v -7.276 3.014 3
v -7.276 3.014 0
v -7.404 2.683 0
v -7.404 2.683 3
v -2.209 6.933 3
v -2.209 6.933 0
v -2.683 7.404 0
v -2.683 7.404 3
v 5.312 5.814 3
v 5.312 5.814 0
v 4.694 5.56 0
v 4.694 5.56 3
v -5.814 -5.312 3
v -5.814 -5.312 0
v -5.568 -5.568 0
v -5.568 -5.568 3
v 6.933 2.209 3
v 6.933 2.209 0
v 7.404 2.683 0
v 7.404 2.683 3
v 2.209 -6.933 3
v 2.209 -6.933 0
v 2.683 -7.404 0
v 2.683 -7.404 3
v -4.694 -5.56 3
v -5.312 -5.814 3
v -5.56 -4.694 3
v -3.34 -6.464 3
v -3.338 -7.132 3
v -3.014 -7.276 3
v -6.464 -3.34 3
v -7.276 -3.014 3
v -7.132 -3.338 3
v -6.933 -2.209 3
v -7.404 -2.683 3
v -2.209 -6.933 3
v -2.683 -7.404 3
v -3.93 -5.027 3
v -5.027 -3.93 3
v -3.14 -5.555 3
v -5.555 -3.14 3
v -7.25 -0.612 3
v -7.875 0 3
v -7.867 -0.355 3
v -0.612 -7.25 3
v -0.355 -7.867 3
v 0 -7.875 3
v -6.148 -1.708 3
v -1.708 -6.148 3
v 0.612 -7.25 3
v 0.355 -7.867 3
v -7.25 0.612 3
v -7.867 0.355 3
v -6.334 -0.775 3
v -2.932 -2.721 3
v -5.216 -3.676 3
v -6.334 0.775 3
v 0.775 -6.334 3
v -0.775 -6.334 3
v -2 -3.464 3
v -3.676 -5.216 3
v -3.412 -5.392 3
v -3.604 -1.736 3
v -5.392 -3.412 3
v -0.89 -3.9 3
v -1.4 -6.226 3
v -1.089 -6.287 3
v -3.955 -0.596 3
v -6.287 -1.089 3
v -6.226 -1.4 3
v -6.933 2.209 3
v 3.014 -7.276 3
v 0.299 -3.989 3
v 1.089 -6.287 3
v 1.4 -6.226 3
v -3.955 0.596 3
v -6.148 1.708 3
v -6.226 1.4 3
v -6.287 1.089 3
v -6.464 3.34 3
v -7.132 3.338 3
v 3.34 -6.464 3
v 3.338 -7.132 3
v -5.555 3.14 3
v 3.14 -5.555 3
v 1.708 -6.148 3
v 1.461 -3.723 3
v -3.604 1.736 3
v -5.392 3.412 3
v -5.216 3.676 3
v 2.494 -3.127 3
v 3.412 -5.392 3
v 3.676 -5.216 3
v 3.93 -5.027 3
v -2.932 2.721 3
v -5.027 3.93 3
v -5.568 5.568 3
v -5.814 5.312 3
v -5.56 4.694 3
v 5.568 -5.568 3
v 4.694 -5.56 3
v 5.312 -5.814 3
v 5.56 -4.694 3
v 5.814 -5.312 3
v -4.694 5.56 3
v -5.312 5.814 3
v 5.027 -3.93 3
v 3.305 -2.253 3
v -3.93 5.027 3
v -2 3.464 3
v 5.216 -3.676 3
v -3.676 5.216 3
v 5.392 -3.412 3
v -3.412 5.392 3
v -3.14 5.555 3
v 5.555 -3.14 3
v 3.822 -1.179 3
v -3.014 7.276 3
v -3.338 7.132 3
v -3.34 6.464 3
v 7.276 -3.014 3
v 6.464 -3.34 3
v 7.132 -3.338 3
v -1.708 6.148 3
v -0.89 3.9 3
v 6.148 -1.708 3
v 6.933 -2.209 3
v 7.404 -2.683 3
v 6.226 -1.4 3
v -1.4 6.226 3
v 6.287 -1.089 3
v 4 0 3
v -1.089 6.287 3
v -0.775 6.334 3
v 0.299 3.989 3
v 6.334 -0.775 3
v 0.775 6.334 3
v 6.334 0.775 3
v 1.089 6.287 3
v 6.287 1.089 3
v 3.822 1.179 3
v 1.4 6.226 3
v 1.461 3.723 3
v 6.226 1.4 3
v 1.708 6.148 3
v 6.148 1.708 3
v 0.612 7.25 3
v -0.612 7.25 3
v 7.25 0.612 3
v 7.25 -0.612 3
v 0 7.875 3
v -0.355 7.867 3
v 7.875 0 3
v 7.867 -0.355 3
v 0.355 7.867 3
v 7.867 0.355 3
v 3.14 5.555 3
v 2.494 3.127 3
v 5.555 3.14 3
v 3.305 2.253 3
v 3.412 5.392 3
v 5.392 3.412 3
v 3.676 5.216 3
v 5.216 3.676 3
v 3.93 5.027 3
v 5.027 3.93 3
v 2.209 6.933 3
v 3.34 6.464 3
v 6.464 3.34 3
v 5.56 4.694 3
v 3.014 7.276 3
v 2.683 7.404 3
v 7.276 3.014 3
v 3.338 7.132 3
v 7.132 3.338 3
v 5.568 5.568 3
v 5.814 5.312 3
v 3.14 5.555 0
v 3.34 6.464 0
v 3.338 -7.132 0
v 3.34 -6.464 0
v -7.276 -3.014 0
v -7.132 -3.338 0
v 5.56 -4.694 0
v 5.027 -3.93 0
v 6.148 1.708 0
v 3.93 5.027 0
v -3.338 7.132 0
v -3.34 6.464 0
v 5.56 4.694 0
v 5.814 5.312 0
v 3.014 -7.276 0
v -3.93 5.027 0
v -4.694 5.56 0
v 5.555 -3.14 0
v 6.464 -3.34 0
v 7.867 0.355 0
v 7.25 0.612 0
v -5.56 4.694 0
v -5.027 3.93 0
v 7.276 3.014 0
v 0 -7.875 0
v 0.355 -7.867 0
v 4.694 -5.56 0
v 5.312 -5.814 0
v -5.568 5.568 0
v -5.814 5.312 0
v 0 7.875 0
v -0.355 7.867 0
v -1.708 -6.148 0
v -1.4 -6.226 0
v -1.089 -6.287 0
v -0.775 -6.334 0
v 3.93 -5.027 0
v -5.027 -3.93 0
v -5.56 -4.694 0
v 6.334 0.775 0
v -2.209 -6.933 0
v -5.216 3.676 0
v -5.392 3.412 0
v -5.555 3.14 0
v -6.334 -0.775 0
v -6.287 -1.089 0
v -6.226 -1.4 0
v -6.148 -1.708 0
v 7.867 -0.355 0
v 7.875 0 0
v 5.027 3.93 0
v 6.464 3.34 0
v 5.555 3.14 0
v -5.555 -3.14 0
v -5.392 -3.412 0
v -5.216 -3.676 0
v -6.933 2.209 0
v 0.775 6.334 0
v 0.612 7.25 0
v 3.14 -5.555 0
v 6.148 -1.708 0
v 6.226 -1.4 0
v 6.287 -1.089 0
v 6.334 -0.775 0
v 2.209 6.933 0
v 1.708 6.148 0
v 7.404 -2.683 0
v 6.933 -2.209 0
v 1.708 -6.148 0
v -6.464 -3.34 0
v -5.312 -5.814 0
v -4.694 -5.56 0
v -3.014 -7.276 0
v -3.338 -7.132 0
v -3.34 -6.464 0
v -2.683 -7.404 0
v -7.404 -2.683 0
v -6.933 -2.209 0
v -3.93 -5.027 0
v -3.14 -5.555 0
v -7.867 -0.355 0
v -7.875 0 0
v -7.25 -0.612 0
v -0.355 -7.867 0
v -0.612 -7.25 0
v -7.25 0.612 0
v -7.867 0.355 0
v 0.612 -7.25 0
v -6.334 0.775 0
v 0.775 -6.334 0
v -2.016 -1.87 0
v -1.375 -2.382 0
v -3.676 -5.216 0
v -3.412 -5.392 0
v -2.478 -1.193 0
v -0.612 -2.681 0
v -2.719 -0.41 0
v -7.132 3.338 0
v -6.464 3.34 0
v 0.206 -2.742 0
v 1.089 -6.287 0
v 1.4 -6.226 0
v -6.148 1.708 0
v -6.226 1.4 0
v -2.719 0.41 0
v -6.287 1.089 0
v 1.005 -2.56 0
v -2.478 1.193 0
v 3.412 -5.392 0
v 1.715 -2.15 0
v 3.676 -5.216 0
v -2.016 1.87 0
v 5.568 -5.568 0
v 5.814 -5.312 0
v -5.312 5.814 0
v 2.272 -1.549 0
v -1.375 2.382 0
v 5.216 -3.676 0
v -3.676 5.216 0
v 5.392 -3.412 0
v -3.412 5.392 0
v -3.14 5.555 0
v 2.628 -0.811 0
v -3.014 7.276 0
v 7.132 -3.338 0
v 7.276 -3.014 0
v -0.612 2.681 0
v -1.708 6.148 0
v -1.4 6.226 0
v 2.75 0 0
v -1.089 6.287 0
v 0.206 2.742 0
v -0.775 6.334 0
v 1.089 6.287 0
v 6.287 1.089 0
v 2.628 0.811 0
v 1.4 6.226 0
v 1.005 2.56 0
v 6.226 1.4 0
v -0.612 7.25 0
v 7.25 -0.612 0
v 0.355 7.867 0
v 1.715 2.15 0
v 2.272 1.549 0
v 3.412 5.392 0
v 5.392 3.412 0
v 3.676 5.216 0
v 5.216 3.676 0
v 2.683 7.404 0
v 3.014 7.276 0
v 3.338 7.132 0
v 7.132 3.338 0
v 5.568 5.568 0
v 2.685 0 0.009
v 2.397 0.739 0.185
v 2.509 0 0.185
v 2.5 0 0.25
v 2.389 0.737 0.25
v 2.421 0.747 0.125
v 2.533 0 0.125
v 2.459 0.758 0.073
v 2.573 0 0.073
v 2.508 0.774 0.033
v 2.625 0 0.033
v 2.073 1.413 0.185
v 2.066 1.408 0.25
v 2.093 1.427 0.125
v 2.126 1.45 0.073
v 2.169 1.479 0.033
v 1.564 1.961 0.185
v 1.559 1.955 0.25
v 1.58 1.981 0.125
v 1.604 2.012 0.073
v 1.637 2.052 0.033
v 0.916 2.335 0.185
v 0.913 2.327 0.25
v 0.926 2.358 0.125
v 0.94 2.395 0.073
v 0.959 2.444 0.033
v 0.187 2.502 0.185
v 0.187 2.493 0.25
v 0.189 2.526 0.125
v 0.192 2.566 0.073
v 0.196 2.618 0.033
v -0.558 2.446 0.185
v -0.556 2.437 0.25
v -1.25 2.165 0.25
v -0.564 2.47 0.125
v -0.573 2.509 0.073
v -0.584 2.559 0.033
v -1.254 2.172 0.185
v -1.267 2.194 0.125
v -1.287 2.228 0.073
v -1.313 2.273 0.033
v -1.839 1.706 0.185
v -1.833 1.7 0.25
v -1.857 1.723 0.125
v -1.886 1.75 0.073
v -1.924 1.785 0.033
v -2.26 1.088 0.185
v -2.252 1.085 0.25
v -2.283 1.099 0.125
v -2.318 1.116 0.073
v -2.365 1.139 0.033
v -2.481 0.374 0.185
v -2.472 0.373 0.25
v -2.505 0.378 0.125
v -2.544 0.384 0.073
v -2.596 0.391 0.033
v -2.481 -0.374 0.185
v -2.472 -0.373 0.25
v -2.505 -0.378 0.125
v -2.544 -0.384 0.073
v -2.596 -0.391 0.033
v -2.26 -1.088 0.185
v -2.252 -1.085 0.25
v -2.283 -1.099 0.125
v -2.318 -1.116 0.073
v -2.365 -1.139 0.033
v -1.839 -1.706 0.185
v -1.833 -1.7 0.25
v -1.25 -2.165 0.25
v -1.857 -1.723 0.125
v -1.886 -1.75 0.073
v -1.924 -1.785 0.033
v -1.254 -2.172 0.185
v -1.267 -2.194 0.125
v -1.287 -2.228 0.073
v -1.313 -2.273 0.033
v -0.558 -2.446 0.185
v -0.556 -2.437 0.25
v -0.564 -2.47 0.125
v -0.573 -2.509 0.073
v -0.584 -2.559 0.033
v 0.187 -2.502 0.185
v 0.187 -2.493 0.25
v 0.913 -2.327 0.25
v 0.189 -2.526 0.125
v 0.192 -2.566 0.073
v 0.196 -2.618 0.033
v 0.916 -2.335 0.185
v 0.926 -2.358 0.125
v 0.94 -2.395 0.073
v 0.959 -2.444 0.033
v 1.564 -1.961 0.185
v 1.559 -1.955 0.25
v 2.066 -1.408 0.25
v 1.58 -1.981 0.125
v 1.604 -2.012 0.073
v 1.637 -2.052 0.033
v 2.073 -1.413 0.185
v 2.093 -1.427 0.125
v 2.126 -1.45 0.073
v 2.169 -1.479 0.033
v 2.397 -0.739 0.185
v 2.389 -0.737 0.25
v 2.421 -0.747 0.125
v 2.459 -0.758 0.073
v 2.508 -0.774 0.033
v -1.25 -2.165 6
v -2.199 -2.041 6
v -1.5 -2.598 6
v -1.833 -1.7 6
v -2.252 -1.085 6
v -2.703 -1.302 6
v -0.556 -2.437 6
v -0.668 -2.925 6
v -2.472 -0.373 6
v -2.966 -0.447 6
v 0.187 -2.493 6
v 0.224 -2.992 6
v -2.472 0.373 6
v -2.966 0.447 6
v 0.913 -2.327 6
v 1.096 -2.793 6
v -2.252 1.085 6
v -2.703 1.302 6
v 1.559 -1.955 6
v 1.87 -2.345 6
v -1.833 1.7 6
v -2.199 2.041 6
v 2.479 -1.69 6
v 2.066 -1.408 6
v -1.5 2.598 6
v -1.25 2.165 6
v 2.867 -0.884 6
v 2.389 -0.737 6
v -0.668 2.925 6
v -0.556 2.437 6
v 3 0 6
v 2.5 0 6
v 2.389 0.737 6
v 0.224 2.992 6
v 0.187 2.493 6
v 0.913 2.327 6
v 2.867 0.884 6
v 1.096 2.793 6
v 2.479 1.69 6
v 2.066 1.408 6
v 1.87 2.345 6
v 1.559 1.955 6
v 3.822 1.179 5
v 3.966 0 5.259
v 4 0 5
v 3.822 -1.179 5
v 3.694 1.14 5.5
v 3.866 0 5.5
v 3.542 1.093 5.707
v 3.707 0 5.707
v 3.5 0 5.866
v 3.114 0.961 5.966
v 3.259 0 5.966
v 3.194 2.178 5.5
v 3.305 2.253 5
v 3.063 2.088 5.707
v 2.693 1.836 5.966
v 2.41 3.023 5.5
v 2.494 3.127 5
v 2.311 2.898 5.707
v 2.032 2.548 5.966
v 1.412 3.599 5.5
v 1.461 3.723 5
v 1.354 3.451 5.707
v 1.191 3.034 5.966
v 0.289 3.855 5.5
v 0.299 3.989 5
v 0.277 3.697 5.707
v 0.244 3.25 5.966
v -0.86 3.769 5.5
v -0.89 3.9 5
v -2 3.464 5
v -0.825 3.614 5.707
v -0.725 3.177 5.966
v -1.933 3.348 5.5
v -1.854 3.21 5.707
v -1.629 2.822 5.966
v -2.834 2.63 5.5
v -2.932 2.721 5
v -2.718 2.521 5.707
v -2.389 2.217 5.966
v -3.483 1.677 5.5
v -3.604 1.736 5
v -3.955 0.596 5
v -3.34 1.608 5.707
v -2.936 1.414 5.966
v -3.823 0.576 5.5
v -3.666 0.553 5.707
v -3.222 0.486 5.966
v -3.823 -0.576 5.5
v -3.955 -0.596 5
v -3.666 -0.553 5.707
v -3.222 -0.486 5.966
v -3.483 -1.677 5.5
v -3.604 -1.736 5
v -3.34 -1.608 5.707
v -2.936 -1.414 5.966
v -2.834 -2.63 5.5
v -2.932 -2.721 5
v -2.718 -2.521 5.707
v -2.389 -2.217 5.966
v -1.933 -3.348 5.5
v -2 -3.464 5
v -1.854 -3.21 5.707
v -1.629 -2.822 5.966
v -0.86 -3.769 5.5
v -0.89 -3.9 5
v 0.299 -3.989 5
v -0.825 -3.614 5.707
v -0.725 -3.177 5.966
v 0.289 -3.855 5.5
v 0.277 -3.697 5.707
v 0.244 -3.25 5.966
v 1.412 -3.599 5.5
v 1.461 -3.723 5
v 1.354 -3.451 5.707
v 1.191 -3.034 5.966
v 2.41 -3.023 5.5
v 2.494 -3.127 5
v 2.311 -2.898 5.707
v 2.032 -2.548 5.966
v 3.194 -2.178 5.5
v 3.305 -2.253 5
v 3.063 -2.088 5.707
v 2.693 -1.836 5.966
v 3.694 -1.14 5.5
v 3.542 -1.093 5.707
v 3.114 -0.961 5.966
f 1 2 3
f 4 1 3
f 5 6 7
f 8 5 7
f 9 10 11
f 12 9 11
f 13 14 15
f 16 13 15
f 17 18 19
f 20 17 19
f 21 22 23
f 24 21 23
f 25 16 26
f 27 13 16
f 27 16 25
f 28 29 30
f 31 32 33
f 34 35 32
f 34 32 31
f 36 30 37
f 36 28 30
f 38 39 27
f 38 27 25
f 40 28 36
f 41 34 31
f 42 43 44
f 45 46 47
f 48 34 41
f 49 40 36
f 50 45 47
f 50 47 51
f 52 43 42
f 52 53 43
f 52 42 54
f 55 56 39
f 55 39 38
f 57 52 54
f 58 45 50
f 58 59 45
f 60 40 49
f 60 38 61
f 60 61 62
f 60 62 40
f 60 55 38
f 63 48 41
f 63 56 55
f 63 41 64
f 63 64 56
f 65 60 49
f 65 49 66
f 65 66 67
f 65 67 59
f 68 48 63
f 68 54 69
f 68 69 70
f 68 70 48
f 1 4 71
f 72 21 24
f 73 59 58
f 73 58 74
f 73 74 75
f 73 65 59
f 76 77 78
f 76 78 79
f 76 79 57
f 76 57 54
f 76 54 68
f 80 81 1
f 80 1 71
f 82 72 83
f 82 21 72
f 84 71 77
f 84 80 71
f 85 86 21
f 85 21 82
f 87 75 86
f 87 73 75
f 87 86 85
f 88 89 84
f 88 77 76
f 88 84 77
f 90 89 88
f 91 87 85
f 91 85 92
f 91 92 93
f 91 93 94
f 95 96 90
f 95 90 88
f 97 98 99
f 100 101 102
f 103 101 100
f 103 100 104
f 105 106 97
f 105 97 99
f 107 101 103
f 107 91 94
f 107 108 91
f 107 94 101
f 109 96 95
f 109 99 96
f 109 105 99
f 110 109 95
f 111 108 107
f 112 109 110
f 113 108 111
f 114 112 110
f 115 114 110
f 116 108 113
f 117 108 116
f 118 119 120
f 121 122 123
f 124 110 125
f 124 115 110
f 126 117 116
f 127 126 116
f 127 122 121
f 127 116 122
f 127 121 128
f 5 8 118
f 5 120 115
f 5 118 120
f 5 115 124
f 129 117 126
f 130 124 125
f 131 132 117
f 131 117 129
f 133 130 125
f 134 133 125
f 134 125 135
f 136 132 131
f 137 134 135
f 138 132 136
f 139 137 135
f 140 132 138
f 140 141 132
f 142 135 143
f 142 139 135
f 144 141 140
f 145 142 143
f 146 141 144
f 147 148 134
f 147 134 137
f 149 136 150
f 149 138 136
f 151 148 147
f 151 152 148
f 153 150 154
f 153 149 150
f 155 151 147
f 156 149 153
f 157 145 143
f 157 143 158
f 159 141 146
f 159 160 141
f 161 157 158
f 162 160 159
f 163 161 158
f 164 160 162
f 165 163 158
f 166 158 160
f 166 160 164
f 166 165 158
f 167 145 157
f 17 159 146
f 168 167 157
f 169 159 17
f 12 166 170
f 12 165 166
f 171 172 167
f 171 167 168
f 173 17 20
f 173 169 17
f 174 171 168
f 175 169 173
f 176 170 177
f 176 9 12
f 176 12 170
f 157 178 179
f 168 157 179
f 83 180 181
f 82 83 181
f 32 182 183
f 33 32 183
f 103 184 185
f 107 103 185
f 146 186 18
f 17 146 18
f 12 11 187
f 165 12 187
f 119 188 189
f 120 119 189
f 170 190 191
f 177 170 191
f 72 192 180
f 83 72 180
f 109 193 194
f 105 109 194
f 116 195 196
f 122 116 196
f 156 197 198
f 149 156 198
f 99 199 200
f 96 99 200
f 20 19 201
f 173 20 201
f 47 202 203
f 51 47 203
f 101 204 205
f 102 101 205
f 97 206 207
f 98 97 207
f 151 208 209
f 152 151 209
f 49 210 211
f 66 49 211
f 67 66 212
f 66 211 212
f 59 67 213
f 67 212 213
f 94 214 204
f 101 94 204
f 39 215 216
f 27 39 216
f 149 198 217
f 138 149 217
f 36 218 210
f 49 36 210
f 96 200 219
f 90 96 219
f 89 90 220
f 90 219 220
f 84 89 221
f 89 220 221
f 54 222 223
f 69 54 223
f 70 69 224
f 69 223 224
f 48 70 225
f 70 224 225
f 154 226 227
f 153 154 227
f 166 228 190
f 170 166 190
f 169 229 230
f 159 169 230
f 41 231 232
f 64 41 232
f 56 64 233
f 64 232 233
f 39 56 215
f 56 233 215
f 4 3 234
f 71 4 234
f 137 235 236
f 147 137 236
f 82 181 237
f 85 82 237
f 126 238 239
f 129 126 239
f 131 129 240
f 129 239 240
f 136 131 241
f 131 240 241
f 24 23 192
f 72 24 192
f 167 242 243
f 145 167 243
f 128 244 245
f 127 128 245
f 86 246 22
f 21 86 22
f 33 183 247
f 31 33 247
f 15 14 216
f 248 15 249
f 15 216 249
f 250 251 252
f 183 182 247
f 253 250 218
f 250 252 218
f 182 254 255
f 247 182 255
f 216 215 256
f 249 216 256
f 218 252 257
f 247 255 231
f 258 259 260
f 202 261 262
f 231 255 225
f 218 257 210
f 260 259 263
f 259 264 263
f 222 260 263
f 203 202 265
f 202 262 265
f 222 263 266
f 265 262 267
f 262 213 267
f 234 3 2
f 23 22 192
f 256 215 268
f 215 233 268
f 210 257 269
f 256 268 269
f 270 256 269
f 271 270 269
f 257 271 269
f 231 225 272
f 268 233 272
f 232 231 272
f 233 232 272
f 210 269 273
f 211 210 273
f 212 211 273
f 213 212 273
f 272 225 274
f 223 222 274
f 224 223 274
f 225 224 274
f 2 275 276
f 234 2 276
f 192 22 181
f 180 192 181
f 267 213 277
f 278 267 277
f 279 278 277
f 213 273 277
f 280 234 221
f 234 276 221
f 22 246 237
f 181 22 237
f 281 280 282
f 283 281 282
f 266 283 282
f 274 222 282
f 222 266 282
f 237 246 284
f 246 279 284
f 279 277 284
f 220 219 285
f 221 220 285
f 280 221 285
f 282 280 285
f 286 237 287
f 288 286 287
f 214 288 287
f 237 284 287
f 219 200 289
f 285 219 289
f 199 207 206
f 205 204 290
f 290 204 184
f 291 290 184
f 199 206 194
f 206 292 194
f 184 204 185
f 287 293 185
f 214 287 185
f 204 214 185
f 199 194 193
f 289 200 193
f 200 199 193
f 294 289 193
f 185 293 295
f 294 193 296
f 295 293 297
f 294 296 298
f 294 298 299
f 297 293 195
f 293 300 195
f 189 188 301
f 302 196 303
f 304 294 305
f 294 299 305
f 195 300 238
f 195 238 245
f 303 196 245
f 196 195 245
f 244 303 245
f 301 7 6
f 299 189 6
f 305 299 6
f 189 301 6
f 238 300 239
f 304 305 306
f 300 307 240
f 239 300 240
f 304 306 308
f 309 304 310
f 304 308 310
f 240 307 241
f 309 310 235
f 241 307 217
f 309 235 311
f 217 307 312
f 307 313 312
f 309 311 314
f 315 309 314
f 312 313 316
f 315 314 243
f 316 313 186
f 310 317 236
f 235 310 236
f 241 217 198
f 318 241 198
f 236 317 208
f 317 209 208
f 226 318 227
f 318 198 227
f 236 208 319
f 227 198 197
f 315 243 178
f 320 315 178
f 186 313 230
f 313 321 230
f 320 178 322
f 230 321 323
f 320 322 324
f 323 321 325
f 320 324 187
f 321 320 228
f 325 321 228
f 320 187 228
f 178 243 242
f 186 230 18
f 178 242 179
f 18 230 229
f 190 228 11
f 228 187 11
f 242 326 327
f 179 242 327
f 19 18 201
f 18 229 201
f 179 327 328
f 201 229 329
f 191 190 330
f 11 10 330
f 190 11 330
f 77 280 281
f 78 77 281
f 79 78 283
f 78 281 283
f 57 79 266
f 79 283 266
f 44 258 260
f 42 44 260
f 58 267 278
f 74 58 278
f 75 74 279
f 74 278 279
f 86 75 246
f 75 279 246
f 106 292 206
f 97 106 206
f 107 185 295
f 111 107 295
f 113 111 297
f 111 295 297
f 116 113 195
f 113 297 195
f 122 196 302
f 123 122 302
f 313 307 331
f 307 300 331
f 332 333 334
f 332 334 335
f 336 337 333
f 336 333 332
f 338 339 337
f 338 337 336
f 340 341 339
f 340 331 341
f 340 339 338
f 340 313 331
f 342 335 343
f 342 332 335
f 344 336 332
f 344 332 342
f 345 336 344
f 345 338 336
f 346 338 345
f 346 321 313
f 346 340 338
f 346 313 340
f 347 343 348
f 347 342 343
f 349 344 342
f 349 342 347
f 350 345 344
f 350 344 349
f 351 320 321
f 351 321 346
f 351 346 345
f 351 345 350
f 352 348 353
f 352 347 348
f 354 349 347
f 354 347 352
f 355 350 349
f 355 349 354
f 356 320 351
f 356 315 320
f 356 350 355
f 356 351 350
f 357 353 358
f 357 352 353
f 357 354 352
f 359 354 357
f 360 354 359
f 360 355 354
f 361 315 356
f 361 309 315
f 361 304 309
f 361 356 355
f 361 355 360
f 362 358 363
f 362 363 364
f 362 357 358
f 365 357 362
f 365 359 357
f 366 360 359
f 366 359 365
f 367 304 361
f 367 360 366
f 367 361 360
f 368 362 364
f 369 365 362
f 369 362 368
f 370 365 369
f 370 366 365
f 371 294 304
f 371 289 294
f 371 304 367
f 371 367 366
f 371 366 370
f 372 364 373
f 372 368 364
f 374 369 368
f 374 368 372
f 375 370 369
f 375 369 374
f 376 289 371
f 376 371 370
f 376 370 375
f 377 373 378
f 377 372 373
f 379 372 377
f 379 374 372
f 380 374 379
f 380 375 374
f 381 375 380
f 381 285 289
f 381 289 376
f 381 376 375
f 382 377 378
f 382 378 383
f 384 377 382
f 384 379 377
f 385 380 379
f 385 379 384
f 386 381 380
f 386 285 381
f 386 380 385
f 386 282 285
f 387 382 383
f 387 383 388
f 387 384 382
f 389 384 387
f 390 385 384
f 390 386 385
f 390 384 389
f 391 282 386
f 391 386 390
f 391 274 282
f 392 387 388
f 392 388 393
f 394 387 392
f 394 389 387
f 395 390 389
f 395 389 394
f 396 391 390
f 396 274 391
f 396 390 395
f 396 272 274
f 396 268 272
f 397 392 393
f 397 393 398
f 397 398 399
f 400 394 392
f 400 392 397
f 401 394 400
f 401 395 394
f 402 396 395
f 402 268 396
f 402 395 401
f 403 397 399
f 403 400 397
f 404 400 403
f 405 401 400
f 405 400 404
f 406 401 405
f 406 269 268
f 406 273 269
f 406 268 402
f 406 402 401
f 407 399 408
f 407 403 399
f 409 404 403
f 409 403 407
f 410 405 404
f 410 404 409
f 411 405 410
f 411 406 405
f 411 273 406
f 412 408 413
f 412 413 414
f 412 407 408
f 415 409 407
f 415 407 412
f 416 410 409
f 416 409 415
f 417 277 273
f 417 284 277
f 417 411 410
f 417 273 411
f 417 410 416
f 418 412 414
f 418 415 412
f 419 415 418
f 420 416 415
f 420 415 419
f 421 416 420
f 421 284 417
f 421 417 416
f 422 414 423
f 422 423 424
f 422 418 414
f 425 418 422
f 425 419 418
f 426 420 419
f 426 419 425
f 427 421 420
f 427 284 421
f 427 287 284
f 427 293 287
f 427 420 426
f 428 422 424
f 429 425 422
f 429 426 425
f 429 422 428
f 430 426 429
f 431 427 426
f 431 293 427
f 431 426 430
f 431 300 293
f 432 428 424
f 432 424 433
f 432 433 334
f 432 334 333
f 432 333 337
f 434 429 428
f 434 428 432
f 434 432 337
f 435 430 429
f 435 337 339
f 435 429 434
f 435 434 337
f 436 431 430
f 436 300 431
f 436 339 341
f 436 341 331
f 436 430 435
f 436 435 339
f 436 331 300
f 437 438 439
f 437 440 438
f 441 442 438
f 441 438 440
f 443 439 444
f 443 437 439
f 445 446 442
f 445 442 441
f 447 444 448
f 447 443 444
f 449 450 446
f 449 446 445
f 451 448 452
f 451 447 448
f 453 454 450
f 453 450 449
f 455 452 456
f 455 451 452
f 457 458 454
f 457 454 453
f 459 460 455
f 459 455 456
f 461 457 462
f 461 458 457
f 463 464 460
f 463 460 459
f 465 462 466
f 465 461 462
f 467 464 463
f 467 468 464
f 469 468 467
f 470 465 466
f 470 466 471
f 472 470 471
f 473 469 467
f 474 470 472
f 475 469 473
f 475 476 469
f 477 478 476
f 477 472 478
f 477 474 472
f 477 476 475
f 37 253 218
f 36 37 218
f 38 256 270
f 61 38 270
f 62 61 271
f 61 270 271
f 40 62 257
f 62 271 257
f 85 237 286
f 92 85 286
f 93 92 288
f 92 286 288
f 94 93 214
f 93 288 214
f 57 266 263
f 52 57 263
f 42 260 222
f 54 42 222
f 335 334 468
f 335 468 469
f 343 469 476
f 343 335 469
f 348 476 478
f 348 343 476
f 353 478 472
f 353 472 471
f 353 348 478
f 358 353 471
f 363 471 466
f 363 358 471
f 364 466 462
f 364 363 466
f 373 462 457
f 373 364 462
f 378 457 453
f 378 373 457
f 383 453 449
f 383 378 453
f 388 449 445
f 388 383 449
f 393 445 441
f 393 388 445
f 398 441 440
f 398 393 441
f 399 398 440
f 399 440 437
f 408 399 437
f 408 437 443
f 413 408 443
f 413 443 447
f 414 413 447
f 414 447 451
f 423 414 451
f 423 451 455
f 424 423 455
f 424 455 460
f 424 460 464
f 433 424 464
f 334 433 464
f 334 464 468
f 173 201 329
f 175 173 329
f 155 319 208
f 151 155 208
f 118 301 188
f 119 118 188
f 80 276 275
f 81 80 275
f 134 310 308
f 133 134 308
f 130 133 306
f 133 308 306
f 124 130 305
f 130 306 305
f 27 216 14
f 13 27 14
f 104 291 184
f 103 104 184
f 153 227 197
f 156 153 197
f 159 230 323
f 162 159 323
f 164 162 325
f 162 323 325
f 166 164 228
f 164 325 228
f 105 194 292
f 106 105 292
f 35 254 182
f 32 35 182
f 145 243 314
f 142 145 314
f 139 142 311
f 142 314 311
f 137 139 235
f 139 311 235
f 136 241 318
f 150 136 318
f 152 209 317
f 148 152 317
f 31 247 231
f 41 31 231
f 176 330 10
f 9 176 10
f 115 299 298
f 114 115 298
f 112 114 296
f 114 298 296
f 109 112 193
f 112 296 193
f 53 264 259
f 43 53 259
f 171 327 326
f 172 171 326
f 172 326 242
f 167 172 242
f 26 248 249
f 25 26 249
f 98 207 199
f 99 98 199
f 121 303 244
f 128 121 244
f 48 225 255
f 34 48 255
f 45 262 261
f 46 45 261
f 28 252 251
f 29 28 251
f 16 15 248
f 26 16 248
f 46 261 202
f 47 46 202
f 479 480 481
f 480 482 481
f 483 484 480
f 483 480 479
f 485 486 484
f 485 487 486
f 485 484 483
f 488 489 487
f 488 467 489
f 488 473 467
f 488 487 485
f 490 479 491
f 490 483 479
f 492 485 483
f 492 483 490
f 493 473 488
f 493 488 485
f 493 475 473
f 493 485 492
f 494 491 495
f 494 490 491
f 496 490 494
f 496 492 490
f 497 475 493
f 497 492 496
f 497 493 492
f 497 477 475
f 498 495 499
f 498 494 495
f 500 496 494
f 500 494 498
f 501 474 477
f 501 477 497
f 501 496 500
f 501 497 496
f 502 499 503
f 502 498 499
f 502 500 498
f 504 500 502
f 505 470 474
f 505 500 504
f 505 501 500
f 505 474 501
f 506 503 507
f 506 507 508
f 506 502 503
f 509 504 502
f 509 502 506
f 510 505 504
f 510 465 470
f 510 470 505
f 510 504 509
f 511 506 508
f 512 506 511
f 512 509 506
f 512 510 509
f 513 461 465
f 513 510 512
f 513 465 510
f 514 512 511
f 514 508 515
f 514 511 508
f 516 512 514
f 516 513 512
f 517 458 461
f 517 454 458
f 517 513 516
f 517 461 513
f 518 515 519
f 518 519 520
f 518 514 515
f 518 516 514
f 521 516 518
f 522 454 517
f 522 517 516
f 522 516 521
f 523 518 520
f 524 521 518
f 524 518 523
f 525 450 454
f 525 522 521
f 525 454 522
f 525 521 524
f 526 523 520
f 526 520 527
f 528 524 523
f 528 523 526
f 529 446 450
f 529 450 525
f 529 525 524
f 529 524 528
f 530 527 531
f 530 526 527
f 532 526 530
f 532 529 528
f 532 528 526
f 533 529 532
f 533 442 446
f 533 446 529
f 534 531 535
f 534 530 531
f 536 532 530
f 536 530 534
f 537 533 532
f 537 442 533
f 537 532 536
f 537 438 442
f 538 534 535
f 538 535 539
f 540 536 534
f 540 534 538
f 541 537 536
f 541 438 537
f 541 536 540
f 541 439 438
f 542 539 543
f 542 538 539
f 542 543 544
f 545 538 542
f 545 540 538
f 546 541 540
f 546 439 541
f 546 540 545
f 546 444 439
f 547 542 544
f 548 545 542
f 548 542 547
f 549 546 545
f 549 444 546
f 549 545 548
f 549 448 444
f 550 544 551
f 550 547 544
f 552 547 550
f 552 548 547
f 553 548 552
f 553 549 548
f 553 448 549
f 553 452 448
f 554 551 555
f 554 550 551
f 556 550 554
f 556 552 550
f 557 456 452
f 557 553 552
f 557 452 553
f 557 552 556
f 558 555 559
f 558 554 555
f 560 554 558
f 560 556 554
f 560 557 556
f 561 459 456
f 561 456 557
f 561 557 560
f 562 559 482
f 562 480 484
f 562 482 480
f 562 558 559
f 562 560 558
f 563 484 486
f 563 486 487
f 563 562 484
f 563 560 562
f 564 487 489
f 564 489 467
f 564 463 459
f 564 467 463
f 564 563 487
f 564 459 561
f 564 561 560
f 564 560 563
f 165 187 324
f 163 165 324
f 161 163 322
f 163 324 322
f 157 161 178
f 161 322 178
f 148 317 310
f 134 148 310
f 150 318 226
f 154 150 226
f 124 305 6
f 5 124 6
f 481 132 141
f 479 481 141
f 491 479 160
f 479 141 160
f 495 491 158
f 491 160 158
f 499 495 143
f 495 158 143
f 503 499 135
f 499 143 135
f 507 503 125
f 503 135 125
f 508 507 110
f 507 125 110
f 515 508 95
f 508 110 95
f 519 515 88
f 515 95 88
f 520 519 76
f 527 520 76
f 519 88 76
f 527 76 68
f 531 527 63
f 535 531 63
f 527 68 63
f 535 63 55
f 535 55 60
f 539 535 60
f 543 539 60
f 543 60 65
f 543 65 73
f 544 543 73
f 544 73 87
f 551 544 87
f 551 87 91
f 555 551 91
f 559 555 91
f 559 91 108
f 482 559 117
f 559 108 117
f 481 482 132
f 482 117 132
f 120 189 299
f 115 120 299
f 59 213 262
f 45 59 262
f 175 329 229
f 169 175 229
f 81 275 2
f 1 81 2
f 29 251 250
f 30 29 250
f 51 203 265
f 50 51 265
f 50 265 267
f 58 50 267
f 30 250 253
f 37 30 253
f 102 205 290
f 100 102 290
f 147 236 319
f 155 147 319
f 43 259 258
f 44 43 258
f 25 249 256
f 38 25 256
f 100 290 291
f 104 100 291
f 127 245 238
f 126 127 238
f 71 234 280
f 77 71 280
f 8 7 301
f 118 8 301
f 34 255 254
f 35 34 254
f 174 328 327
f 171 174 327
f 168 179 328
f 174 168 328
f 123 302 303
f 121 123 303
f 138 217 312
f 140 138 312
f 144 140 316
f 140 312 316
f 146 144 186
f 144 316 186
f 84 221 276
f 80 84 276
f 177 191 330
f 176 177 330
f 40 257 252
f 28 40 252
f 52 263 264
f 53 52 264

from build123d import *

# Parameters (mm, degrees)
SKETCH1_R           = 2.5
BOSS_EXTRUDE3_DEPTH = 3
SKETCH4_R           = 4
SKETCH4_R_2         = 2.5
BOSS_EXTRUDE4_DEPTH = 3
FILLET1_R           = 1
FILLET2_R           = 0.25


with BuildPart() as part:
    # Sketch1 → Boss-Extrude3 (new body)
    with BuildSketch(Plane.XY):
        with BuildLine():
            Line((-0.612376666, 7.250336436), (-0.775314301, 6.33381714))
            ThreePointArc((-0.775314301, 6.33381714), (-1.244889549, 6.258482391), (-1.707549869, 6.148383956))
            Line((-1.707549869, 6.148383956), (-2.208821365, 6.932783841))
            Line((-2.208821365, 6.932783841), (-2.682669744, 7.403979203))
            Line((-2.682669744, 7.403979203), (-3.01363203, 7.275551319))
            Line((-3.01363203, 7.275551319), (-3.338469935, 7.13233787))
            Line((-3.338469935, 7.13233787), (-3.340345901, 6.464091033))
            Line((-3.340345901, 6.464091033), (-3.140143897, 5.554984081))
            ThreePointArc((-3.140143897, 5.554984081), (-3.545145497, 5.30568518), (-3.930455051, 5.02691505))
            Line((-3.930455051, 5.02691505), (-4.693746367, 5.559777753))
            Line((-4.693746367, 5.559777753), (-5.311843844, 5.813771579))
            Line((-5.311843844, 5.813771579), (-5.568465902, 5.568465902))
            Line((-5.568465902, 5.568465902), (-5.813771579, 5.311843844))
            Line((-5.813771579, 5.311843844), (-5.559777753, 4.693746367))
            Line((-5.559777753, 4.693746367), (-5.02691505, 3.930455051))
            ThreePointArc((-5.02691505, 3.930455051), (-5.30568518, 3.545145497), (-5.554984081, 3.140143897))
            Line((-5.554984081, 3.140143897), (-6.464091033, 3.340345901))
            Line((-6.464091033, 3.340345901), (-7.13233787, 3.338469935))
            Line((-7.13233787, 3.338469935), (-7.275551319, 3.01363203))
            Line((-7.275551319, 3.01363203), (-7.403979203, 2.682669744))
            Line((-7.403979203, 2.682669744), (-6.932783841, 2.208821365))
            Line((-6.932783841, 2.208821365), (-6.148383956, 1.707549869))
            ThreePointArc((-6.148383956, 1.707549869), (-6.258482391, 1.244889549), (-6.33381714, 0.775314301))
            Line((-6.33381714, 0.775314301), (-7.250336436, 0.612376666))
            Line((-7.250336436, 0.612376666), (-7.866998111, 0.354916505))
            Line((-7.866998111, 0.354916505), (-7.875, 0))
            Line((-7.875, 0), (-7.866998111, -0.354916505))
            Line((-7.866998111, -0.354916505), (-7.250336436, -0.612376666))
            Line((-7.250336436, -0.612376666), (-6.33381714, -0.775314301))
            ThreePointArc((-6.33381714, -0.775314301), (-6.258482391, -1.244889549), (-6.148383956, -1.707549869))
            Line((-6.148383956, -1.707549869), (-6.932783841, -2.208821365))
            Line((-6.932783841, -2.208821365), (-7.403979203, -2.682669744))
            Line((-7.403979203, -2.682669744), (-7.275551319, -3.01363203))
            Line((-7.275551319, -3.01363203), (-7.13233787, -3.338469935))
            Line((-7.13233787, -3.338469935), (-6.464091033, -3.340345901))
            Line((-6.464091033, -3.340345901), (-5.554984081, -3.140143897))
            ThreePointArc((-5.554984081, -3.140143897), (-5.30568518, -3.545145497), (-5.02691505, -3.930455051))
            Line((-5.02691505, -3.930455051), (-5.559777753, -4.693746367))
            Line((-5.559777753, -4.693746367), (-5.813771579, -5.311843844))
            Line((-5.813771579, -5.311843844), (-5.568465902, -5.568465902))
            Line((-5.568465902, -5.568465902), (-5.311843844, -5.813771579))
            Line((-5.311843844, -5.813771579), (-4.693746367, -5.559777753))
            Line((-4.693746367, -5.559777753), (-3.930455051, -5.02691505))
            ThreePointArc((-3.930455051, -5.02691505), (-3.545145497, -5.30568518), (-3.140143897, -5.554984081))
            Line((-3.140143897, -5.554984081), (-3.340345901, -6.464091033))
            Line((-3.340345901, -6.464091033), (-3.338469935, -7.13233787))
            Line((-3.338469935, -7.13233787), (-3.01363203, -7.275551319))
            Line((-3.01363203, -7.275551319), (-2.682669744, -7.403979203))
            Line((-2.682669744, -7.403979203), (-2.208821365, -6.932783841))
            Line((-2.208821365, -6.932783841), (-1.707549869, -6.148383956))
            ThreePointArc((-1.707549869, -6.148383956), (-1.244889549, -6.258482391), (-0.775314301, -6.33381714))
            Line((-0.775314301, -6.33381714), (-0.612376666, -7.250336436))
            Line((-0.612376666, -7.250336436), (-0.354916505, -7.866998111))
            Line((-0.354916505, -7.866998111), (0, -7.875))
            Line((0, -7.875), (0.354916505, -7.866998111))
            Line((0.354916505, -7.866998111), (0.612376666, -7.250336436))
            Line((0.612376666, -7.250336436), (0.775314301, -6.33381714))
            ThreePointArc((0.775314301, -6.33381714), (1.244889549, -6.258482391), (1.707549869, -6.148383956))
            Line((1.707549869, -6.148383956), (2.208821365, -6.932783841))
            Line((2.208821365, -6.932783841), (2.682669744, -7.403979203))
            Line((2.682669744, -7.403979203), (3.01363203, -7.275551319))
            Line((3.01363203, -7.275551319), (3.338469935, -7.13233787))
            Line((3.338469935, -7.13233787), (3.340345901, -6.464091033))
            Line((3.340345901, -6.464091033), (3.140143897, -5.554984081))
            ThreePointArc((3.140143897, -5.554984081), (3.545145497, -5.30568518), (3.930455051, -5.02691505))
            Line((3.930455051, -5.02691505), (4.693746367, -5.559777753))
            Line((4.693746367, -5.559777753), (5.311843844, -5.813771579))
            Line((5.311843844, -5.813771579), (5.568465902, -5.568465902))
            Line((5.568465902, -5.568465902), (5.813771579, -5.311843844))
            Line((5.813771579, -5.311843844), (5.559777753, -4.693746367))
            Line((5.559777753, -4.693746367), (5.02691505, -3.930455051))
            ThreePointArc((5.02691505, -3.930455051), (5.30568518, -3.545145497), (5.554984081, -3.140143897))
            Line((5.554984081, -3.140143897), (6.464091033, -3.340345901))
            Line((6.464091033, -3.340345901), (7.13233787, -3.338469935))
            Line((7.13233787, -3.338469935), (7.275551319, -3.01363203))
            Line((7.275551319, -3.01363203), (7.403979203, -2.682669744))
            Line((7.403979203, -2.682669744), (6.932783841, -2.208821365))
            Line((6.932783841, -2.208821365), (6.148383956, -1.707549869))
            ThreePointArc((6.148383956, -1.707549869), (6.258482391, -1.244889549), (6.33381714, -0.775314301))
            Line((6.33381714, -0.775314301), (7.250336436, -0.612376666))
            Line((7.250336436, -0.612376666), (7.866998111, -0.354916505))
            Line((7.866998111, -0.354916505), (7.875, 0))
            Line((7.875, 0), (7.866998111, 0.354916505))
            Line((7.866998111, 0.354916505), (7.250336436, 0.612376666))
            Line((7.250336436, 0.612376666), (6.33381714, 0.775314301))
            ThreePointArc((6.33381714, 0.775314301), (6.258482391, 1.244889549), (6.148383956, 1.707549869))
            Line((6.148383956, 1.707549869), (6.932783841, 2.208821365))
            Line((6.932783841, 2.208821365), (7.403979203, 2.682669744))
            Line((7.403979203, 2.682669744), (7.275551319, 3.01363203))
            Line((7.275551319, 3.01363203), (7.13233787, 3.338469935))
            Line((7.13233787, 3.338469935), (6.464091033, 3.340345901))
            Line((6.464091033, 3.340345901), (5.554984081, 3.140143897))
            ThreePointArc((5.554984081, 3.140143897), (5.30568518, 3.545145497), (5.02691505, 3.930455051))
            Line((5.02691505, 3.930455051), (5.559777753, 4.693746367))
            Line((5.559777753, 4.693746367), (5.813771579, 5.311843844))
            Line((5.813771579, 5.311843844), (5.568465902, 5.568465902))
            Line((5.568465902, 5.568465902), (5.311843844, 5.813771579))
            Line((5.311843844, 5.813771579), (4.693746367, 5.559777753))
            Line((4.693746367, 5.559777753), (3.930455051, 5.02691505))
            ThreePointArc((3.930455051, 5.02691505), (3.545145497, 5.30568518), (3.140143897, 5.554984081))
            Line((3.140143897, 5.554984081), (3.340345901, 6.464091033))
            Line((3.340345901, 6.464091033), (3.338469935, 7.13233787))
            Line((3.338469935, 7.13233787), (3.01363203, 7.275551319))
            Line((3.01363203, 7.275551319), (2.682669744, 7.403979203))
            Line((2.682669744, 7.403979203), (2.208821365, 6.932783841))
            Line((2.208821365, 6.932783841), (1.707549869, 6.148383956))
            ThreePointArc((1.707549869, 6.148383956), (1.244889549, 6.258482391), (0.775314301, 6.33381714))
            Line((0.775314301, 6.33381714), (0.612376666, 7.250336436))
            Line((0.612376666, 7.250336436), (0.354916505, 7.866998111))
            Line((0.354916505, 7.866998111), (0, 7.875))
            Line((0, 7.875), (-0.354916505, 7.866998111))
            Line((-0.354916505, 7.866998111), (-0.612376666, 7.250336436))
        make_face()
        Circle(SKETCH1_R, mode=Mode.SUBTRACT)
    extrude(amount=BOSS_EXTRUDE3_DEPTH)

    # Sketch4 → Boss-Extrude4 (add)
    with BuildSketch(Plane.XY.offset(3)):
        Circle(SKETCH4_R)
        Circle(SKETCH4_R_2, mode=Mode.SUBTRACT)
    extrude(amount=BOSS_EXTRUDE4_DEPTH)

    # Fillet1
    fillet1_edges = [part.edges().sort_by_distance(p)[0] for p in [
        (-4, 0, 6),
    ]]
    fillet(fillet1_edges, radius=FILLET1_R)

    # Fillet2
    fillet2_edges = [part.edges().sort_by_distance(p)[0] for p in [
        (-2.5, 0, 0),
    ]]
    fillet(fillet2_edges, radius=FILLET2_R)


solid = part.part
